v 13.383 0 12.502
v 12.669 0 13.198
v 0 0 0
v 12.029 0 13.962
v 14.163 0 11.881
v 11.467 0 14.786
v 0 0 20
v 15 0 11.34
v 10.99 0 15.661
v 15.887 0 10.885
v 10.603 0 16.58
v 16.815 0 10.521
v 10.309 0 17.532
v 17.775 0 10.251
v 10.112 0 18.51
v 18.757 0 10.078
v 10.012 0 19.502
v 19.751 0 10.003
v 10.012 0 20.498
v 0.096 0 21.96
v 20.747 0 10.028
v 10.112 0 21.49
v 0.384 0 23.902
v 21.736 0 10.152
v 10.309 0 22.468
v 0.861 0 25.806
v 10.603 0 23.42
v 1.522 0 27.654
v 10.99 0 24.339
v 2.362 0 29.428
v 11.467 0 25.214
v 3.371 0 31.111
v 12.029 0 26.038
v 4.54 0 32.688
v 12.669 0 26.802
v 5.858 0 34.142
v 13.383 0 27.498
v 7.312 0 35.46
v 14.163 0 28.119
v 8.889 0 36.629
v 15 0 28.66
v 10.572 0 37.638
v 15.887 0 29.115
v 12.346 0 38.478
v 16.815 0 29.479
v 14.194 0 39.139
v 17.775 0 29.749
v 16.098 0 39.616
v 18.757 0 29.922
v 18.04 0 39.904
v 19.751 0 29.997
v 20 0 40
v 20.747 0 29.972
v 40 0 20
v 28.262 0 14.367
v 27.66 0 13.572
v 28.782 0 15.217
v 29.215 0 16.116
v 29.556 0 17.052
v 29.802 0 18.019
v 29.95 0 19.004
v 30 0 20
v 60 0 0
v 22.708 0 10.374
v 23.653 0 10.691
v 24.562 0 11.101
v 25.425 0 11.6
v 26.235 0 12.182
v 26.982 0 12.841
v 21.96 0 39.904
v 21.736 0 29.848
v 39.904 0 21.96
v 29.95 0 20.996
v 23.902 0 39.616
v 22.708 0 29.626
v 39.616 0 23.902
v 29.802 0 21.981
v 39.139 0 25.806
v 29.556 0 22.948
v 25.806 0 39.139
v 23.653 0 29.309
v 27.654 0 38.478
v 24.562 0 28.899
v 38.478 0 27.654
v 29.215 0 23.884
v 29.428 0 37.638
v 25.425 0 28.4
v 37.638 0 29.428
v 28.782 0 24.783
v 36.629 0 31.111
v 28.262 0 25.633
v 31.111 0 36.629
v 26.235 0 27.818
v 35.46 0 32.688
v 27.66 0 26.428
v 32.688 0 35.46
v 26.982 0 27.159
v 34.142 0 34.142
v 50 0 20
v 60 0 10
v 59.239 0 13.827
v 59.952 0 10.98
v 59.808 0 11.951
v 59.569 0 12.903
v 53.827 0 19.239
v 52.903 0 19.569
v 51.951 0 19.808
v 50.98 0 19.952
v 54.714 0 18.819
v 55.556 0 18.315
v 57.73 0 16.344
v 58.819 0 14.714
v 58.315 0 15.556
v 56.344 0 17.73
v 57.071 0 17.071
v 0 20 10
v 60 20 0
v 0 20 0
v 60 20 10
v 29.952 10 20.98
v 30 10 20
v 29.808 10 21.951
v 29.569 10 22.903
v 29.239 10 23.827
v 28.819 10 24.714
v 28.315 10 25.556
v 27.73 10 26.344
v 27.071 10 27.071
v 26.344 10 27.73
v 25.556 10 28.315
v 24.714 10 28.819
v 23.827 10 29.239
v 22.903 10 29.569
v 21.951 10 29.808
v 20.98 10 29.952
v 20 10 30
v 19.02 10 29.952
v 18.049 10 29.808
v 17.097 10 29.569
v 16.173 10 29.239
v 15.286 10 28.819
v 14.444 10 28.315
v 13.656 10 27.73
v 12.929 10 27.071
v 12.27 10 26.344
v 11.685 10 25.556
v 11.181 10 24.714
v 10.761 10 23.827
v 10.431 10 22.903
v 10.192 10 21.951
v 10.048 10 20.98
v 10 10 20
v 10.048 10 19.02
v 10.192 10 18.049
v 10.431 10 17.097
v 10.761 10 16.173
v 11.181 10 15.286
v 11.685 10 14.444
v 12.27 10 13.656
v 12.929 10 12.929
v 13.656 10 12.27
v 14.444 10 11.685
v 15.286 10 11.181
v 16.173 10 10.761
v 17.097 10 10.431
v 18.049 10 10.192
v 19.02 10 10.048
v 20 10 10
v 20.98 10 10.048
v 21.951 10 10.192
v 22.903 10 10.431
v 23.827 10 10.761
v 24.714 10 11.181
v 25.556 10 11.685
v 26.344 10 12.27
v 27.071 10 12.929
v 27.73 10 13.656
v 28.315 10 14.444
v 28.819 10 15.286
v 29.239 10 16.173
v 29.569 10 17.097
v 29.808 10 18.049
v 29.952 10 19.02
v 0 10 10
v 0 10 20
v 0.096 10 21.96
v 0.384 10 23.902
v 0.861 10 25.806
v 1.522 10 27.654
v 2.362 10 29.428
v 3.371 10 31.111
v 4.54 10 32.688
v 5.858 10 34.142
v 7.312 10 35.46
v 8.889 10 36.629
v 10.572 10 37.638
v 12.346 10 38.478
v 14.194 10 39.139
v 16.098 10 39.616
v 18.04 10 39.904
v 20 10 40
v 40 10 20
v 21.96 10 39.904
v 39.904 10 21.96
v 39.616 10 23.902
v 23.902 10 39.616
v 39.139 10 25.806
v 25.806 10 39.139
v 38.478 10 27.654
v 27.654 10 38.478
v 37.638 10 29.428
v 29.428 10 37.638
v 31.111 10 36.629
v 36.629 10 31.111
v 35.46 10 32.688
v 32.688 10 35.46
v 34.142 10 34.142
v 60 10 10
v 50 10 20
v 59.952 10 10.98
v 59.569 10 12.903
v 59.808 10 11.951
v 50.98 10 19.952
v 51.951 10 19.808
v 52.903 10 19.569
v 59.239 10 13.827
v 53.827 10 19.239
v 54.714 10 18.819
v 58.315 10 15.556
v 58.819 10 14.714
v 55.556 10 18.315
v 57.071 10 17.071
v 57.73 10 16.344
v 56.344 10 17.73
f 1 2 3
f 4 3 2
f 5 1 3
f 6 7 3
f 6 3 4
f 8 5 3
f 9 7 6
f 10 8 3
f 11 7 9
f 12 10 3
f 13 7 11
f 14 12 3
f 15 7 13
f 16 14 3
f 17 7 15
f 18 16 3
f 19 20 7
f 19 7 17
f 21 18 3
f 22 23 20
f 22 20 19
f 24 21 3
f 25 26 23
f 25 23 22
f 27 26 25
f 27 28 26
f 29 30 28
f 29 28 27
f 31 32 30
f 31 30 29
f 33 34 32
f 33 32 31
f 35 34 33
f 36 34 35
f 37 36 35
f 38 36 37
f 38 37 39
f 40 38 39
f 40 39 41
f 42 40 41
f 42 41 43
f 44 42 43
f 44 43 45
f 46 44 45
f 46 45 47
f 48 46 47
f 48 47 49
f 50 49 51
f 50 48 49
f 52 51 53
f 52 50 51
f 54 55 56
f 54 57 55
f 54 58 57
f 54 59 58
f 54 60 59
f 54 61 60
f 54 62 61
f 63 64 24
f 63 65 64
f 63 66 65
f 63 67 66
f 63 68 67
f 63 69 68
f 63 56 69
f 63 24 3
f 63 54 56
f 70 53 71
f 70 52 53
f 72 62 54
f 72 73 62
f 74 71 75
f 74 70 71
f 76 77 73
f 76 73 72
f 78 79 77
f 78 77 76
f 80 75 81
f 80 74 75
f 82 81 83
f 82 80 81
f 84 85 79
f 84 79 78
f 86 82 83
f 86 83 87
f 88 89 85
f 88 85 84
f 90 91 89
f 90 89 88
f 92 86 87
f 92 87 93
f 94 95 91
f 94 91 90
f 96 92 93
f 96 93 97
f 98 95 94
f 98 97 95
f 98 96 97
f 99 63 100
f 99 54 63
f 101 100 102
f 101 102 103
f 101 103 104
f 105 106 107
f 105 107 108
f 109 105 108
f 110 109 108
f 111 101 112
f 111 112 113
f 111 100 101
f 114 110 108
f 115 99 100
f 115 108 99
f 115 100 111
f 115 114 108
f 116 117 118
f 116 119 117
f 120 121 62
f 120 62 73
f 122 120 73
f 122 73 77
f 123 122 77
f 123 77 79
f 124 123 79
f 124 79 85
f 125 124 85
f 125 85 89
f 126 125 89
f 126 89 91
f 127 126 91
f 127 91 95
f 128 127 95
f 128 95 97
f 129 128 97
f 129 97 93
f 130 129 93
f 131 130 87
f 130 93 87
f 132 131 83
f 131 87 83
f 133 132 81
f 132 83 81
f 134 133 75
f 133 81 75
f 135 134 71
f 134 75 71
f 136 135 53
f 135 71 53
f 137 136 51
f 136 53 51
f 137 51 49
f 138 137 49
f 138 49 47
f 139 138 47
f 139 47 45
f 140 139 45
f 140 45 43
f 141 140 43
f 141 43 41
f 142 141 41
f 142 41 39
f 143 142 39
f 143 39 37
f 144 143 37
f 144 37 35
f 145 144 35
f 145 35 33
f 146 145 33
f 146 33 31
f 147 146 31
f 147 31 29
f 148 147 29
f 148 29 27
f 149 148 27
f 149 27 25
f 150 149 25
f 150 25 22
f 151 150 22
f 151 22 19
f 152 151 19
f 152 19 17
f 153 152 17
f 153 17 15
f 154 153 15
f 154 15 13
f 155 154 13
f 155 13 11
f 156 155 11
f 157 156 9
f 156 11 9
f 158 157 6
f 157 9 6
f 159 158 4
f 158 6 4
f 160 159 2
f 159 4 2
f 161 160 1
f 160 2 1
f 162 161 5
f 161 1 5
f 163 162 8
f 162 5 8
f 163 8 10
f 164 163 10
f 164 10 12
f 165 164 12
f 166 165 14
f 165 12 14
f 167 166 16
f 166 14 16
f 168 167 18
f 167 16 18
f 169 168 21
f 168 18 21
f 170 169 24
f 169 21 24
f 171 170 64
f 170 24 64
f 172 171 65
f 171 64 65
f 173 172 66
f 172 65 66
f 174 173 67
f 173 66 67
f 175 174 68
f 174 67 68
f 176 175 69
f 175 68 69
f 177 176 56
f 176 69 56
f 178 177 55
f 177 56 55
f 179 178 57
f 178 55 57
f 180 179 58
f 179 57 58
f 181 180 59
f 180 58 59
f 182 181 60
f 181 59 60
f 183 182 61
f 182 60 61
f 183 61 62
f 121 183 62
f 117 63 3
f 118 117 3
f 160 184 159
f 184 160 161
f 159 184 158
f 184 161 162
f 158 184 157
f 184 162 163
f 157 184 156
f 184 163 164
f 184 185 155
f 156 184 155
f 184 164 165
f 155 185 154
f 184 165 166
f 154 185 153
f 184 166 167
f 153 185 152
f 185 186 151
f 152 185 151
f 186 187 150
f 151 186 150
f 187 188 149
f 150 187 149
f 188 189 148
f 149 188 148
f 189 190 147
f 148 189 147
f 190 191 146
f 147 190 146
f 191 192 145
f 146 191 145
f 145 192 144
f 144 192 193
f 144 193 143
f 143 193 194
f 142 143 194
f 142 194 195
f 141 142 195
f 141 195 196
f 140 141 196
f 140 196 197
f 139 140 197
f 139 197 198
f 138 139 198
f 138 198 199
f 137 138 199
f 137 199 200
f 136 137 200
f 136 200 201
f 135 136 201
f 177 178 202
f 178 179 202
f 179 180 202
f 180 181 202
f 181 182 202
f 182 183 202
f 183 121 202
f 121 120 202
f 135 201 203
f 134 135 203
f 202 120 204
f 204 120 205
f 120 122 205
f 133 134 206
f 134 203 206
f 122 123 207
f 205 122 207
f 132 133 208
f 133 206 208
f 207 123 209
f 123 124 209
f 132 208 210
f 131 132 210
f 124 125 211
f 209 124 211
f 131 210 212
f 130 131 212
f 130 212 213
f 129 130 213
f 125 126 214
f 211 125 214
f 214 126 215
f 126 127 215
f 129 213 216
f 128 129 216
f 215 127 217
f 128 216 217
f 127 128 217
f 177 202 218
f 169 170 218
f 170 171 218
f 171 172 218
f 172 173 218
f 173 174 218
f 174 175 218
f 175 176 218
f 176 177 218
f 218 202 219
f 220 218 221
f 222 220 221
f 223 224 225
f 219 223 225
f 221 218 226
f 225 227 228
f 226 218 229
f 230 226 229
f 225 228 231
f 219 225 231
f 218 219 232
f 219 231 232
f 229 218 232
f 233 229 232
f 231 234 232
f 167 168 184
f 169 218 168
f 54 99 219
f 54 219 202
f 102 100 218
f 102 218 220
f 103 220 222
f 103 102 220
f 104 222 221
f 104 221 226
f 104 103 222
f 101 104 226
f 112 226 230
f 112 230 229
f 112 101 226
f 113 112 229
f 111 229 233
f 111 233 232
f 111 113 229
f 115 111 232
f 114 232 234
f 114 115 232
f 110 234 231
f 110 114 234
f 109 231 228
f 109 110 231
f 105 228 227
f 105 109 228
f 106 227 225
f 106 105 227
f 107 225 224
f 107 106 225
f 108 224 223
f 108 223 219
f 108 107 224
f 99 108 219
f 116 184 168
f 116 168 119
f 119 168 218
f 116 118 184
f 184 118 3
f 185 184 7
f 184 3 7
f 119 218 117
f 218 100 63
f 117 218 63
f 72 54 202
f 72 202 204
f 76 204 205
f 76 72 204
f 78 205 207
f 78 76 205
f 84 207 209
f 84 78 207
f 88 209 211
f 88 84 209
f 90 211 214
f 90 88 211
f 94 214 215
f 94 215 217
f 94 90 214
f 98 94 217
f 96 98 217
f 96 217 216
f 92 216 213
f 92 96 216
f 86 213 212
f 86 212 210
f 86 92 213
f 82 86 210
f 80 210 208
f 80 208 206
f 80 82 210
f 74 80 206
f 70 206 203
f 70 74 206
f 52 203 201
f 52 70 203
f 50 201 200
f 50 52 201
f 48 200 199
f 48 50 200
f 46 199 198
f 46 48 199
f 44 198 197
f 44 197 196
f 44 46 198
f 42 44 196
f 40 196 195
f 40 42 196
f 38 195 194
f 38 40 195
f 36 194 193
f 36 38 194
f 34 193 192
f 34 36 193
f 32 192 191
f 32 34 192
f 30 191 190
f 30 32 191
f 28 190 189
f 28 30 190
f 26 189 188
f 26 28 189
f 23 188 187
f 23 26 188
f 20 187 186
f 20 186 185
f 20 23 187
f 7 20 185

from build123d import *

# Parameters (mm, degrees)
F0_R     = 10
F1_DEPTH = 10
F3_DEPTH = 10


with BuildPart() as f1:
    # F0 (on Front) → F1 (new body)
    with BuildSketch(Plane.XZ):
        with BuildLine():
            Line((0, 20), (0, 0))
            Line((0, 0), (20, 0))
            Line((20, 0), (60, 0))
            Line((60, 0), (60, 10))
            ThreePointArc((60, 10), (57.071068, 17.071068), (50, 20))
            Line((50, 20), (40, 20))
            ThreePointArc((40, 20), (20, 40), (0, 20))
        make_face()
        with Locations((20, 20)):
            Circle(F0_R, mode=Mode.SUBTRACT)
    extrude(amount=-F1_DEPTH)

    # F2 (on face) → F3 (join)
    with BuildSketch(Plane(origin=(0, 10, 0), x_dir=(-1, 0, 0), z_dir=(0, 1, 0))):
        Polygon((-60, 0), (0, 0), (0, 10), (-20, 10), (-60, 10), align=None)
    extrude(amount=F3_DEPTH)


solid = f1.part
